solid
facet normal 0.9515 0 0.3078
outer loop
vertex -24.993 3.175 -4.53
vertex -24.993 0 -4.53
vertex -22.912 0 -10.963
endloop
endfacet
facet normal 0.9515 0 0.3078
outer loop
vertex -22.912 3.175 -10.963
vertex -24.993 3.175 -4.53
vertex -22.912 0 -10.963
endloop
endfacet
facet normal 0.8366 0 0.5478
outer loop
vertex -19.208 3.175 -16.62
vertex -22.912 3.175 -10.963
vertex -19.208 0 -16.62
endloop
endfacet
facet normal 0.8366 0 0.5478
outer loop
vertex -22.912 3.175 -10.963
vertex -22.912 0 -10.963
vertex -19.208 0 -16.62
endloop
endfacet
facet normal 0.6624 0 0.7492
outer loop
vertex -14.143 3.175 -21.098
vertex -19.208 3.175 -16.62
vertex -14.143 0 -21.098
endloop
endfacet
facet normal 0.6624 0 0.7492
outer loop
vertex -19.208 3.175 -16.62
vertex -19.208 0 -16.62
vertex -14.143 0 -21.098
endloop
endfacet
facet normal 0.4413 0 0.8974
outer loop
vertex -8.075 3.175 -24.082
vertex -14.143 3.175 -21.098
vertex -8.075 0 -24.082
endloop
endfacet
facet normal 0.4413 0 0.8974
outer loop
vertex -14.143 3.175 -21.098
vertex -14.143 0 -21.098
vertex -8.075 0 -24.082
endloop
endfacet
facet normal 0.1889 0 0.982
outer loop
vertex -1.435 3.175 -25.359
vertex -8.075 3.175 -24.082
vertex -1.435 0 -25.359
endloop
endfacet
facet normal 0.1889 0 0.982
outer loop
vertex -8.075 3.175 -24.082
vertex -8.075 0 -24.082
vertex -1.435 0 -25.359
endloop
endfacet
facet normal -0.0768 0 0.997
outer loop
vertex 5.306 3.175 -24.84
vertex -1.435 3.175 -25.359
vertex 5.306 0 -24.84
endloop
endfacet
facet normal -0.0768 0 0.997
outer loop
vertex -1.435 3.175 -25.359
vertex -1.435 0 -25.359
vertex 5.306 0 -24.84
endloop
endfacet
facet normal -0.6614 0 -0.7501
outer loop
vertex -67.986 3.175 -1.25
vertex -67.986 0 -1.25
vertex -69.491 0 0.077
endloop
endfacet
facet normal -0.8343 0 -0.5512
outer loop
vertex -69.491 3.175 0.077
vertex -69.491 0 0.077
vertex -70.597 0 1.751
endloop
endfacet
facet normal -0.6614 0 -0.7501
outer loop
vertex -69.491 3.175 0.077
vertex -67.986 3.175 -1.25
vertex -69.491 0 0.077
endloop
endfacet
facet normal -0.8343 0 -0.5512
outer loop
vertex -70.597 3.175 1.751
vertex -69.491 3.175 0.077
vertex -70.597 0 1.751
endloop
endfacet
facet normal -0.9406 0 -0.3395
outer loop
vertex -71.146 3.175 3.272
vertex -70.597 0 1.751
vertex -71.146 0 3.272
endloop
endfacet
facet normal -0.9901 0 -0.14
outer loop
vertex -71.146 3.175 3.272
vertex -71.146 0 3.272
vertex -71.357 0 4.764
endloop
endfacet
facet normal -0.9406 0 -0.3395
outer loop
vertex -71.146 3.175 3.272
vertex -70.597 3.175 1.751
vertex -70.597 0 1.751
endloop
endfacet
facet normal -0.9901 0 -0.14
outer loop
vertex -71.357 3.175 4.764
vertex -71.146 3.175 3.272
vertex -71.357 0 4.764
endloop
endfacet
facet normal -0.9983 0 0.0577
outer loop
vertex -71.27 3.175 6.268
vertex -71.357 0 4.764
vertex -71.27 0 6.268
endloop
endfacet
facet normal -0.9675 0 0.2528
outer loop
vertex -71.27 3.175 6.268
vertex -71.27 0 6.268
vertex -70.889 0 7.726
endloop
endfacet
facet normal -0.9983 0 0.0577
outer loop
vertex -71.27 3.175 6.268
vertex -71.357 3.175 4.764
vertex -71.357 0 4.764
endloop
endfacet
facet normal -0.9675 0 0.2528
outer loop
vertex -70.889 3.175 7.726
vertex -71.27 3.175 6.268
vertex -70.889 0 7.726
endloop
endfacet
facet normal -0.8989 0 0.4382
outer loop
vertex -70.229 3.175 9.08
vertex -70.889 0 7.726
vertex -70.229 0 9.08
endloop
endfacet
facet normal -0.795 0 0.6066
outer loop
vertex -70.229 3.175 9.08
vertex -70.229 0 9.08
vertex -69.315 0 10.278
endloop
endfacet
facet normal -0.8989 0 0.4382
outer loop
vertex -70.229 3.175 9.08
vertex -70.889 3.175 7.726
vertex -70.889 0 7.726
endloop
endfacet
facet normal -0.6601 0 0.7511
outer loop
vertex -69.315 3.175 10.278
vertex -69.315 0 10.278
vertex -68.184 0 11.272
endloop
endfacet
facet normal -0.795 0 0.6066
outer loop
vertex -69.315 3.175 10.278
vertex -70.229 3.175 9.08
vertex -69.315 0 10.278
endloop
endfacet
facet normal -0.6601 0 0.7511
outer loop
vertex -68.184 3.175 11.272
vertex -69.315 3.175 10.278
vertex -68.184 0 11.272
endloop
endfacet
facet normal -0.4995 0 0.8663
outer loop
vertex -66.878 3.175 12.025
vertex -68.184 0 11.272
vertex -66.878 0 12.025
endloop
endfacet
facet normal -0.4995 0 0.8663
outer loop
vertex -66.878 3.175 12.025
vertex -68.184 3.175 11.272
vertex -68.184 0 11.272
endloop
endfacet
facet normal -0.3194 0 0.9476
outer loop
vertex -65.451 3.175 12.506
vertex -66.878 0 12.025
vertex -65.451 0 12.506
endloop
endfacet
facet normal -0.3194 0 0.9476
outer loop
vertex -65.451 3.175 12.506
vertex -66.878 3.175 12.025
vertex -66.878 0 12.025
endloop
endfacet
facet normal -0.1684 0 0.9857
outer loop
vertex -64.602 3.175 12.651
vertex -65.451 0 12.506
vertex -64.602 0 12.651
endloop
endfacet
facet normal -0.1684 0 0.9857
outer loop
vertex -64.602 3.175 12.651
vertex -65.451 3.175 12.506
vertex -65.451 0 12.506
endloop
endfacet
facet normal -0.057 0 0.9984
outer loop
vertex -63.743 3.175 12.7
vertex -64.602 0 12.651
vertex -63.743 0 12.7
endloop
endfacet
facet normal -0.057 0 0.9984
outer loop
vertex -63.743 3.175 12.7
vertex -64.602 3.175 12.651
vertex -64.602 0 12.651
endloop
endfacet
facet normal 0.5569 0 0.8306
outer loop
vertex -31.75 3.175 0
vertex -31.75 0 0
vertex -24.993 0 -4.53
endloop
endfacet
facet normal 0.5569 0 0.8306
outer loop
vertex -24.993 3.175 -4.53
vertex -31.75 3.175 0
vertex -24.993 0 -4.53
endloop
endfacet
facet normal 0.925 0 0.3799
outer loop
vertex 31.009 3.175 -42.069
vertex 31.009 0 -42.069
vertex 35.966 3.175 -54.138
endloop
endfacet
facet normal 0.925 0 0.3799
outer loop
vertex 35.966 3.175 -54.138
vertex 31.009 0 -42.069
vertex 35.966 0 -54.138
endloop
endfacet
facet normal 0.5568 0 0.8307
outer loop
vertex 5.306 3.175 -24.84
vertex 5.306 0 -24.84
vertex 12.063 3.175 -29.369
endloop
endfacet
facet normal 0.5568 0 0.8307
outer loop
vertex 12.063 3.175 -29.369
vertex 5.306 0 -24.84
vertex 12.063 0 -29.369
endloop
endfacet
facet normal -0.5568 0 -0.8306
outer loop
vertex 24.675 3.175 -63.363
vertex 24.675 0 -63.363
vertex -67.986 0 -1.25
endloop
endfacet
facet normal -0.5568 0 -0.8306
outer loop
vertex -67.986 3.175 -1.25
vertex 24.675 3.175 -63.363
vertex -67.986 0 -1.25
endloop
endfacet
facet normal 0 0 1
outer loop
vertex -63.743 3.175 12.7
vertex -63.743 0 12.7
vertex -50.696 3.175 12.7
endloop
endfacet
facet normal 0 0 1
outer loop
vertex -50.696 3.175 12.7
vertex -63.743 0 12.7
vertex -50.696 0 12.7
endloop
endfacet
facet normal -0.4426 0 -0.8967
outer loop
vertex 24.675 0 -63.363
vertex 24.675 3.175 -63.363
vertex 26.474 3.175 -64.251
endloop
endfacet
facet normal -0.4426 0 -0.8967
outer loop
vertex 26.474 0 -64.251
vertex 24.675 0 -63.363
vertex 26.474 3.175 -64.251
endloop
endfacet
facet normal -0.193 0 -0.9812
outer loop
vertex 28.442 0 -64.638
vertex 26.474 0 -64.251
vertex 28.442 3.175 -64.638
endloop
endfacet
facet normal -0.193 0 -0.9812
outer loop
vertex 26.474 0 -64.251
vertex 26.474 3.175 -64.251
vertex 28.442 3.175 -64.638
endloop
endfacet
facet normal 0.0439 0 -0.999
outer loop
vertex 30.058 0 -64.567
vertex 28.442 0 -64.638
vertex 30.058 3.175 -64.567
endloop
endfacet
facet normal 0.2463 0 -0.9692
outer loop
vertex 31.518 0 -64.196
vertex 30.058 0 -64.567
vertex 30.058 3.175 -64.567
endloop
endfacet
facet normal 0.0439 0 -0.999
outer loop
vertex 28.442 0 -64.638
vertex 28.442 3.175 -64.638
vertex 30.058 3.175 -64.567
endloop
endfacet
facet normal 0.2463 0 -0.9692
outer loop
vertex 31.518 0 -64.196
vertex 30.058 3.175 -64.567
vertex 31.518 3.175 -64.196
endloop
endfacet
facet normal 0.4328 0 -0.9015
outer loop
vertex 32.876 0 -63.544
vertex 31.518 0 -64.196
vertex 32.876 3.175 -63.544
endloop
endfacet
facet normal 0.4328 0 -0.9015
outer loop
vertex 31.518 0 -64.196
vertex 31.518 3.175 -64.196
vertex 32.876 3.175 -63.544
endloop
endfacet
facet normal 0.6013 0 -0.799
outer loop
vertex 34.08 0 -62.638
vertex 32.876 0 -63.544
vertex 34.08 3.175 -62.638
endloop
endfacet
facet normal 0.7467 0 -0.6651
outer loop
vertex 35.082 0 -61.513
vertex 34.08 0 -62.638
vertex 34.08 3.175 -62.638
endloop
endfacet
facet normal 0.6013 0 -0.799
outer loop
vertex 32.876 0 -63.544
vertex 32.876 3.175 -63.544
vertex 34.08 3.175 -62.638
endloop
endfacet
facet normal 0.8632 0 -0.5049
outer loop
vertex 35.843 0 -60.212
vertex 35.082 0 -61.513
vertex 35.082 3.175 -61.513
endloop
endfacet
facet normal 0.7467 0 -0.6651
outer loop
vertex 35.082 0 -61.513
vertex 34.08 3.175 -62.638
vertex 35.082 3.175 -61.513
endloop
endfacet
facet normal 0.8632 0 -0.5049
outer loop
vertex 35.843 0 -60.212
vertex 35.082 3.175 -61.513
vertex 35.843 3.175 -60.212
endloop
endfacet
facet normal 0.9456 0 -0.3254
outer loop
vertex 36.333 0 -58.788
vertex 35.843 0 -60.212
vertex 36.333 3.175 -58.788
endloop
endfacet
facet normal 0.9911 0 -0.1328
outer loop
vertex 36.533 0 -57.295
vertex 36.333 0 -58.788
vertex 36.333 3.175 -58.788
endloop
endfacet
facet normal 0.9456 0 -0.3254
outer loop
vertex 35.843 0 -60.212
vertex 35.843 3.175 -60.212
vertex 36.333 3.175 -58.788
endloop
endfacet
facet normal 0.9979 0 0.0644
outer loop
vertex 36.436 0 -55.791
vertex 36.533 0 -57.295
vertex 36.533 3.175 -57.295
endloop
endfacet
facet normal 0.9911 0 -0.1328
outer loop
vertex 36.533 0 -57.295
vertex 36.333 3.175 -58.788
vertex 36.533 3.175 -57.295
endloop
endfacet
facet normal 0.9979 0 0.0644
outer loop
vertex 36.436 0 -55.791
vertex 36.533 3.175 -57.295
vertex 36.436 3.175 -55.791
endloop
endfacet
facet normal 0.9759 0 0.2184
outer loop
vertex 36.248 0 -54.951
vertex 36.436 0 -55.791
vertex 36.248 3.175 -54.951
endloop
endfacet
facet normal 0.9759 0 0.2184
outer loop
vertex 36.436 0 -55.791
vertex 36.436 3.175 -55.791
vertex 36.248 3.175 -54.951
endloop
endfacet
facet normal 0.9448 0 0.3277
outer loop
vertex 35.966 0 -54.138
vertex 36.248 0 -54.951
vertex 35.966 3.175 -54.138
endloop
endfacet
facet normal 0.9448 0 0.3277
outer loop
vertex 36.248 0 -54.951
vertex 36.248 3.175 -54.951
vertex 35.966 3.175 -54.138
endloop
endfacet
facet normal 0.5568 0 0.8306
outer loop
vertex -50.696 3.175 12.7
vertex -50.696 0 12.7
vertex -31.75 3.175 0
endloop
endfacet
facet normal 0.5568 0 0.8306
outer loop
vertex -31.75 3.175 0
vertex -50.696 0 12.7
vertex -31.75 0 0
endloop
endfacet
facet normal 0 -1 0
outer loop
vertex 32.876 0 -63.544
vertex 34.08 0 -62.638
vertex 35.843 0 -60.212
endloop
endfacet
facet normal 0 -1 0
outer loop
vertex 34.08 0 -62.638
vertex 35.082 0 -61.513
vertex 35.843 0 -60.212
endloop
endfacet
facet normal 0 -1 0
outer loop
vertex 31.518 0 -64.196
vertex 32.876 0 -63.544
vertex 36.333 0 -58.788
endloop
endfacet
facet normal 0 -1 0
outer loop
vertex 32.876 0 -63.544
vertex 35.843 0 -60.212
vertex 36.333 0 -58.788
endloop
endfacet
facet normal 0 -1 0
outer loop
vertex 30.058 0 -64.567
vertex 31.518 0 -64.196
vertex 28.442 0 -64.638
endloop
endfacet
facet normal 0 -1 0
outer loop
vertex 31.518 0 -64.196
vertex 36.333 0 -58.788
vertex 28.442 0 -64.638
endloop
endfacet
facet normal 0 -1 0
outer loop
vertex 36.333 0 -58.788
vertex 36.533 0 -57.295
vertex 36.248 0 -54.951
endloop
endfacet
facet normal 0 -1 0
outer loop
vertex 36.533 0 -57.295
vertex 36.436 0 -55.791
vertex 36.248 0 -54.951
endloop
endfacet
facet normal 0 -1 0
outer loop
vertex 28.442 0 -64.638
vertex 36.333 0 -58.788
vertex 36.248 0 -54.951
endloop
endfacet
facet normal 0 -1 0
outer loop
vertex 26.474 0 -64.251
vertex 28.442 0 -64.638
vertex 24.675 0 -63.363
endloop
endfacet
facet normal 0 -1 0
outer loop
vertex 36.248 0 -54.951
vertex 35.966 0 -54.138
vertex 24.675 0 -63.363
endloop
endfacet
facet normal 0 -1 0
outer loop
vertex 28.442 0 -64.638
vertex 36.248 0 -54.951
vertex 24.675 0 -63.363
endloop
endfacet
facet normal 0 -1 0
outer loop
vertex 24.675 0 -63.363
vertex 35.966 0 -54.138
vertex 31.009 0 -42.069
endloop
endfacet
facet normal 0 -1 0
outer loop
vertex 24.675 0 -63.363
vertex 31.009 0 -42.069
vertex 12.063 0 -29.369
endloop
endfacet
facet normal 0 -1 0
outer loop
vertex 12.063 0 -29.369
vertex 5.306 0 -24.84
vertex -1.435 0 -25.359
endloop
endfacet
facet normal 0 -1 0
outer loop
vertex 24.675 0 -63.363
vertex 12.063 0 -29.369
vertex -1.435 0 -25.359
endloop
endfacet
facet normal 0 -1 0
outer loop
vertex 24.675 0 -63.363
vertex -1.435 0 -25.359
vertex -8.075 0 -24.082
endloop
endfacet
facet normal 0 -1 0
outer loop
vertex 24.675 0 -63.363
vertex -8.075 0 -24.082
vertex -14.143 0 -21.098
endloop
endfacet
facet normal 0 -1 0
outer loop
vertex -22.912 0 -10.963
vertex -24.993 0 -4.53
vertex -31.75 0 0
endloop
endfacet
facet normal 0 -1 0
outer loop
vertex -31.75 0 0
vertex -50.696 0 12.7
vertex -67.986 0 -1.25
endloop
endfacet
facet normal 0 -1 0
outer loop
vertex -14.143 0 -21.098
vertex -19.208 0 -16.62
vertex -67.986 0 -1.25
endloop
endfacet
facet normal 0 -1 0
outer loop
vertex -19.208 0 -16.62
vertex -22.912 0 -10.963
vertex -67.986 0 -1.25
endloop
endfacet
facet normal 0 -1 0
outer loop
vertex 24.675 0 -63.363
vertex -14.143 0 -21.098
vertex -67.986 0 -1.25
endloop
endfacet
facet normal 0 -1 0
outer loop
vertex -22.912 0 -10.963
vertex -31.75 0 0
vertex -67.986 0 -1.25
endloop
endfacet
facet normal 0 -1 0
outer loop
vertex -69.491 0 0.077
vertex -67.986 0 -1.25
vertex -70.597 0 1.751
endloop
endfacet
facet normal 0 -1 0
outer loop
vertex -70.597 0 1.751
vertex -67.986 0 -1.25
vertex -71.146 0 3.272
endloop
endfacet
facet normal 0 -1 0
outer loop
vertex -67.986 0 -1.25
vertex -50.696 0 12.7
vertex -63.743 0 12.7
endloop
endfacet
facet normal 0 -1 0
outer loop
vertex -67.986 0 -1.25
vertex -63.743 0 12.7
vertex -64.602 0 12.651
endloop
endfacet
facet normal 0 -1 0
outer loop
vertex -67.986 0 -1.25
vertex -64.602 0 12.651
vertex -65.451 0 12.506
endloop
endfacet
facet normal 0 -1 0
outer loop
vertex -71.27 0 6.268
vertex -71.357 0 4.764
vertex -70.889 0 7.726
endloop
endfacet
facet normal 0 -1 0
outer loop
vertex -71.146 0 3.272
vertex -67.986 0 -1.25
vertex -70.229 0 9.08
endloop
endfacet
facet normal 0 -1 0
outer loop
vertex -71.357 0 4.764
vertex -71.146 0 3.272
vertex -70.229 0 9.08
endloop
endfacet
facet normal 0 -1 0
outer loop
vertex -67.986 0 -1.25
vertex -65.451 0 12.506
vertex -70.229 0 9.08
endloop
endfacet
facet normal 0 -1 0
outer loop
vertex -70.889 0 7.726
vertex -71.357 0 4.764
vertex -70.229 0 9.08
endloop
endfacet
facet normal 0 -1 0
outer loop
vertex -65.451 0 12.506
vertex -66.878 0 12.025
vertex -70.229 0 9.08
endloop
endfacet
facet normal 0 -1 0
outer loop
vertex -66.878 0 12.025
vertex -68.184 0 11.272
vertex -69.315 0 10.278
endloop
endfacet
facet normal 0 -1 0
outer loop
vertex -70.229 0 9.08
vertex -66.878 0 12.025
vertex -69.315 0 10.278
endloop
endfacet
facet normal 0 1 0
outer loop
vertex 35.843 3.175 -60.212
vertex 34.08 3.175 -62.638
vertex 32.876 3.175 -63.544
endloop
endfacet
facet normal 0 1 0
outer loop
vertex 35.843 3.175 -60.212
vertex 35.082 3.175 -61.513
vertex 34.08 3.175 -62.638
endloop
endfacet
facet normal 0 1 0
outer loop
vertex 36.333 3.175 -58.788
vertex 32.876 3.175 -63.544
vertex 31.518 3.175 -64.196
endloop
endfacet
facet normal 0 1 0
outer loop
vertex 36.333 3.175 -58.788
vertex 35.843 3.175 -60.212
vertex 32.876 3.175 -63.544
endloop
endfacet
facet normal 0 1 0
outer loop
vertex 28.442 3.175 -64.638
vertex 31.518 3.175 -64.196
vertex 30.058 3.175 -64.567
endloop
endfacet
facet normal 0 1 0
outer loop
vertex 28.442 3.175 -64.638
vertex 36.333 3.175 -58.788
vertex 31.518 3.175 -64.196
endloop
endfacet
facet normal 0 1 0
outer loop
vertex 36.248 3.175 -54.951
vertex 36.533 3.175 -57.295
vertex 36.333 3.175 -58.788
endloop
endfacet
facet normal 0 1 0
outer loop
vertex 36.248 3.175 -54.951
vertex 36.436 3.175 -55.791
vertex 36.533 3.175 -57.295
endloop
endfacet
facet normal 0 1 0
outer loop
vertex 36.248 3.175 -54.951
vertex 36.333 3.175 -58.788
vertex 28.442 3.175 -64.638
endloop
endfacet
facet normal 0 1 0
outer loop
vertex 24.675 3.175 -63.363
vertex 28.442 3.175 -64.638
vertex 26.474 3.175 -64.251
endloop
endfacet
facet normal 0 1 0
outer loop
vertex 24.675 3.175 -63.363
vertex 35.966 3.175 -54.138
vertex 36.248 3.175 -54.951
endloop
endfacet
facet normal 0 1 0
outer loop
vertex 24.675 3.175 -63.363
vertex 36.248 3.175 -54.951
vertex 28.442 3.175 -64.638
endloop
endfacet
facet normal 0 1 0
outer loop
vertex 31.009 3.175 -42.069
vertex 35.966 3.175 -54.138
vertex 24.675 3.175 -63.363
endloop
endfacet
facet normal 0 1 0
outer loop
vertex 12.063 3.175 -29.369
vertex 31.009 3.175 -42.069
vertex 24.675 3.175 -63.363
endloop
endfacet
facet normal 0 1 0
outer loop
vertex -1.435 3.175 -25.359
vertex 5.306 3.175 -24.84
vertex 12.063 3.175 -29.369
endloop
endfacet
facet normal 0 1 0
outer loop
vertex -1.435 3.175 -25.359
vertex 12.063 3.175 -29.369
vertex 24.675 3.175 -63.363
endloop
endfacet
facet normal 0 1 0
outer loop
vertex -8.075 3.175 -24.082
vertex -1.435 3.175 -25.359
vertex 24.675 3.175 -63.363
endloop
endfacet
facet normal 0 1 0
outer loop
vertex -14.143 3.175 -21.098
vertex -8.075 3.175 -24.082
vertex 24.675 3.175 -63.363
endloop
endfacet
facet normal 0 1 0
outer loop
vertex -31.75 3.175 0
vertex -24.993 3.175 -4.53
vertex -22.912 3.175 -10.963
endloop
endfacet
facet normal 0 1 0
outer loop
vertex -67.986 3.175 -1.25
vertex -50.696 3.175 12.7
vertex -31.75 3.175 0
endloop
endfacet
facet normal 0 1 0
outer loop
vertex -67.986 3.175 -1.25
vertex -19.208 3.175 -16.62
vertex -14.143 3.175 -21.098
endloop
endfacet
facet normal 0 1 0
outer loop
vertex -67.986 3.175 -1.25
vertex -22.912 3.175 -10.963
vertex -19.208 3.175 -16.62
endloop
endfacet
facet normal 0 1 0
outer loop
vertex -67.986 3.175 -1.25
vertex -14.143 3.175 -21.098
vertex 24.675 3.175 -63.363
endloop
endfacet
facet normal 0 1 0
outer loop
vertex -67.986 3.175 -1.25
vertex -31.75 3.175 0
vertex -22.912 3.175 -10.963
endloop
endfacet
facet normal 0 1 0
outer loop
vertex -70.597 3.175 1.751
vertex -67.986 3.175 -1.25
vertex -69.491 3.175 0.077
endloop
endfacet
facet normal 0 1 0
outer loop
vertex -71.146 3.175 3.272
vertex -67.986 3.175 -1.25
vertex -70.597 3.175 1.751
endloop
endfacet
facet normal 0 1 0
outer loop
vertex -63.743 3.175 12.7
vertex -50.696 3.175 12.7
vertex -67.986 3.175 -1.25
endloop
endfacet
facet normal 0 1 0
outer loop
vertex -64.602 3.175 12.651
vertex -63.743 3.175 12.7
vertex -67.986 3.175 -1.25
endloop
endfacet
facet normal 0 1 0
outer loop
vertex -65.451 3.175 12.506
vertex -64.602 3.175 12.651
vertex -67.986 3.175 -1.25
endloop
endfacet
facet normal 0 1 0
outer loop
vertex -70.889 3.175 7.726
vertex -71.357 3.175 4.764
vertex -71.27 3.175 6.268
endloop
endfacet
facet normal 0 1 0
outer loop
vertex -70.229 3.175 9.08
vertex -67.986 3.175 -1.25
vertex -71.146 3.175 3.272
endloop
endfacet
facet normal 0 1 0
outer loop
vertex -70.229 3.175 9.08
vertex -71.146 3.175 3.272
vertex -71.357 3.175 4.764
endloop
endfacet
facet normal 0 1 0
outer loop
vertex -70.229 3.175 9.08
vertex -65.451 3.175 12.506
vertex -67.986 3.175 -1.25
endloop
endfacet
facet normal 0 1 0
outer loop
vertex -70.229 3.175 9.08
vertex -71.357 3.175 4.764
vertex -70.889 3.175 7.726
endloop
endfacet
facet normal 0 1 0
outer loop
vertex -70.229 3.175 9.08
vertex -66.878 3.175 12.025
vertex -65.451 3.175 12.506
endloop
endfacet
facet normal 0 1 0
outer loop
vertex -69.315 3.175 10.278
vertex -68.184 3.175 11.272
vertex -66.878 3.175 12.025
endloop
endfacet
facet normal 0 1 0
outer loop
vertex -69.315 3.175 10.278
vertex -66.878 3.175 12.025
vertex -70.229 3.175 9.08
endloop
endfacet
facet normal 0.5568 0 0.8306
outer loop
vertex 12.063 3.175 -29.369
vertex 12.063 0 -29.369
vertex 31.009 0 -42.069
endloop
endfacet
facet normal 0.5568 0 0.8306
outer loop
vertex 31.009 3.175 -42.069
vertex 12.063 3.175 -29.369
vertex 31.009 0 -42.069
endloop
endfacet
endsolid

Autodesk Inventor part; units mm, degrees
ref_plane "YZ Plane" through (0, 0, 0) normal (1, 0, 0) x (0, 1, 0)
ref_plane "XZ Plane" through (0, 0, 0) normal (0, 1, 0) x (-1, 0, 0)
ref_plane "XY Plane" through (0, 0, 0) normal (0, 0, 1) x (1, 0, 0)
sketch "Sketch1" plane through (0, 0, 0) normal (0, 1, 0) x (-1, 0, 0)
  circle A0 centre (0, 0) radius 19.812
  line L0 (69.85, 0) -> (31.75, 0)
  line L1 (-12.0631, -29.3691) -> (-26.5388, -64.612)
  line L2 (-26.5388, -64.612) -> (69.85, 0)
  line L3 (69.85, 0) -> (88.796, 12.7)
  line L4 (88.796, 12.7) -> (50.696, 12.7)
  line L5 (50.696, 12.7) -> (31.75, 0)
  line L6 (-12.0631, -29.3691) -> (-31.0091, -42.0691)
  line L7 (-31.0091, -42.0691) -> (-45.4848, -77.312)
  line L8 (-45.4848, -77.312) -> (-26.5388, -64.612)
  arc A1 (-5.306, -24.8396) -> (24.9929, -4.5295) centre (0, 0) ccw
  line L9 (31.75, 0) -> (24.9929, -4.5295)
  line L10 (-5.306, -24.8396) -> (-12.0631, -29.3691)
  dimension "d0" = 112.33
  dimension "d2" = 39.624
  dimension "d3" = 31.75
  dimension "d4" = 31.75
  dimension "d5" = 38.1
  dimension "d6" = 38.1
  dimension "d7" = 112.33
  dimension "d10" = 12.7
  dimension "d12" = 12.7
  dimension "d13" = 25.4
extrude "Extrusion1" add sketch "Sketch1" along normal blind 3.175 contours L2 L1 L10 A1 L9 L0 | L0 L5 L4 L3 | L8 L7 L6 L1
sketch "Sketch2" plane through (0, 0, 0) normal (0, -1, 0) x (1, 0, 0)
  line L0 (45.4848, -77.312) -> (-88.796, 12.7) projected
  line L1 (31.0091, -42.0691) -> (45.4848, -77.312) projected
  line L2 (5.306, -24.8396) -> (31.0091, -42.0691) projected
  arc A0 (-24.9929, -4.5295) -> (5.306, -24.8396) centre (0, 0) ccw projected
  line L3 (-50.696, 12.7) -> (-24.9929, -4.5295) projected
  line L4 (-88.796, 12.7) -> (-50.696, 12.7) projected
fillet "Fillet1" radius 7.62 2 edges at (-88.796, 1.5875, 12.7) (45.4848, 1.5875, -77.312)
equation "\"d4\" = d3"
equation "\"d7\" = d0"
properties part number "gusset" material "Stainless Steel"
